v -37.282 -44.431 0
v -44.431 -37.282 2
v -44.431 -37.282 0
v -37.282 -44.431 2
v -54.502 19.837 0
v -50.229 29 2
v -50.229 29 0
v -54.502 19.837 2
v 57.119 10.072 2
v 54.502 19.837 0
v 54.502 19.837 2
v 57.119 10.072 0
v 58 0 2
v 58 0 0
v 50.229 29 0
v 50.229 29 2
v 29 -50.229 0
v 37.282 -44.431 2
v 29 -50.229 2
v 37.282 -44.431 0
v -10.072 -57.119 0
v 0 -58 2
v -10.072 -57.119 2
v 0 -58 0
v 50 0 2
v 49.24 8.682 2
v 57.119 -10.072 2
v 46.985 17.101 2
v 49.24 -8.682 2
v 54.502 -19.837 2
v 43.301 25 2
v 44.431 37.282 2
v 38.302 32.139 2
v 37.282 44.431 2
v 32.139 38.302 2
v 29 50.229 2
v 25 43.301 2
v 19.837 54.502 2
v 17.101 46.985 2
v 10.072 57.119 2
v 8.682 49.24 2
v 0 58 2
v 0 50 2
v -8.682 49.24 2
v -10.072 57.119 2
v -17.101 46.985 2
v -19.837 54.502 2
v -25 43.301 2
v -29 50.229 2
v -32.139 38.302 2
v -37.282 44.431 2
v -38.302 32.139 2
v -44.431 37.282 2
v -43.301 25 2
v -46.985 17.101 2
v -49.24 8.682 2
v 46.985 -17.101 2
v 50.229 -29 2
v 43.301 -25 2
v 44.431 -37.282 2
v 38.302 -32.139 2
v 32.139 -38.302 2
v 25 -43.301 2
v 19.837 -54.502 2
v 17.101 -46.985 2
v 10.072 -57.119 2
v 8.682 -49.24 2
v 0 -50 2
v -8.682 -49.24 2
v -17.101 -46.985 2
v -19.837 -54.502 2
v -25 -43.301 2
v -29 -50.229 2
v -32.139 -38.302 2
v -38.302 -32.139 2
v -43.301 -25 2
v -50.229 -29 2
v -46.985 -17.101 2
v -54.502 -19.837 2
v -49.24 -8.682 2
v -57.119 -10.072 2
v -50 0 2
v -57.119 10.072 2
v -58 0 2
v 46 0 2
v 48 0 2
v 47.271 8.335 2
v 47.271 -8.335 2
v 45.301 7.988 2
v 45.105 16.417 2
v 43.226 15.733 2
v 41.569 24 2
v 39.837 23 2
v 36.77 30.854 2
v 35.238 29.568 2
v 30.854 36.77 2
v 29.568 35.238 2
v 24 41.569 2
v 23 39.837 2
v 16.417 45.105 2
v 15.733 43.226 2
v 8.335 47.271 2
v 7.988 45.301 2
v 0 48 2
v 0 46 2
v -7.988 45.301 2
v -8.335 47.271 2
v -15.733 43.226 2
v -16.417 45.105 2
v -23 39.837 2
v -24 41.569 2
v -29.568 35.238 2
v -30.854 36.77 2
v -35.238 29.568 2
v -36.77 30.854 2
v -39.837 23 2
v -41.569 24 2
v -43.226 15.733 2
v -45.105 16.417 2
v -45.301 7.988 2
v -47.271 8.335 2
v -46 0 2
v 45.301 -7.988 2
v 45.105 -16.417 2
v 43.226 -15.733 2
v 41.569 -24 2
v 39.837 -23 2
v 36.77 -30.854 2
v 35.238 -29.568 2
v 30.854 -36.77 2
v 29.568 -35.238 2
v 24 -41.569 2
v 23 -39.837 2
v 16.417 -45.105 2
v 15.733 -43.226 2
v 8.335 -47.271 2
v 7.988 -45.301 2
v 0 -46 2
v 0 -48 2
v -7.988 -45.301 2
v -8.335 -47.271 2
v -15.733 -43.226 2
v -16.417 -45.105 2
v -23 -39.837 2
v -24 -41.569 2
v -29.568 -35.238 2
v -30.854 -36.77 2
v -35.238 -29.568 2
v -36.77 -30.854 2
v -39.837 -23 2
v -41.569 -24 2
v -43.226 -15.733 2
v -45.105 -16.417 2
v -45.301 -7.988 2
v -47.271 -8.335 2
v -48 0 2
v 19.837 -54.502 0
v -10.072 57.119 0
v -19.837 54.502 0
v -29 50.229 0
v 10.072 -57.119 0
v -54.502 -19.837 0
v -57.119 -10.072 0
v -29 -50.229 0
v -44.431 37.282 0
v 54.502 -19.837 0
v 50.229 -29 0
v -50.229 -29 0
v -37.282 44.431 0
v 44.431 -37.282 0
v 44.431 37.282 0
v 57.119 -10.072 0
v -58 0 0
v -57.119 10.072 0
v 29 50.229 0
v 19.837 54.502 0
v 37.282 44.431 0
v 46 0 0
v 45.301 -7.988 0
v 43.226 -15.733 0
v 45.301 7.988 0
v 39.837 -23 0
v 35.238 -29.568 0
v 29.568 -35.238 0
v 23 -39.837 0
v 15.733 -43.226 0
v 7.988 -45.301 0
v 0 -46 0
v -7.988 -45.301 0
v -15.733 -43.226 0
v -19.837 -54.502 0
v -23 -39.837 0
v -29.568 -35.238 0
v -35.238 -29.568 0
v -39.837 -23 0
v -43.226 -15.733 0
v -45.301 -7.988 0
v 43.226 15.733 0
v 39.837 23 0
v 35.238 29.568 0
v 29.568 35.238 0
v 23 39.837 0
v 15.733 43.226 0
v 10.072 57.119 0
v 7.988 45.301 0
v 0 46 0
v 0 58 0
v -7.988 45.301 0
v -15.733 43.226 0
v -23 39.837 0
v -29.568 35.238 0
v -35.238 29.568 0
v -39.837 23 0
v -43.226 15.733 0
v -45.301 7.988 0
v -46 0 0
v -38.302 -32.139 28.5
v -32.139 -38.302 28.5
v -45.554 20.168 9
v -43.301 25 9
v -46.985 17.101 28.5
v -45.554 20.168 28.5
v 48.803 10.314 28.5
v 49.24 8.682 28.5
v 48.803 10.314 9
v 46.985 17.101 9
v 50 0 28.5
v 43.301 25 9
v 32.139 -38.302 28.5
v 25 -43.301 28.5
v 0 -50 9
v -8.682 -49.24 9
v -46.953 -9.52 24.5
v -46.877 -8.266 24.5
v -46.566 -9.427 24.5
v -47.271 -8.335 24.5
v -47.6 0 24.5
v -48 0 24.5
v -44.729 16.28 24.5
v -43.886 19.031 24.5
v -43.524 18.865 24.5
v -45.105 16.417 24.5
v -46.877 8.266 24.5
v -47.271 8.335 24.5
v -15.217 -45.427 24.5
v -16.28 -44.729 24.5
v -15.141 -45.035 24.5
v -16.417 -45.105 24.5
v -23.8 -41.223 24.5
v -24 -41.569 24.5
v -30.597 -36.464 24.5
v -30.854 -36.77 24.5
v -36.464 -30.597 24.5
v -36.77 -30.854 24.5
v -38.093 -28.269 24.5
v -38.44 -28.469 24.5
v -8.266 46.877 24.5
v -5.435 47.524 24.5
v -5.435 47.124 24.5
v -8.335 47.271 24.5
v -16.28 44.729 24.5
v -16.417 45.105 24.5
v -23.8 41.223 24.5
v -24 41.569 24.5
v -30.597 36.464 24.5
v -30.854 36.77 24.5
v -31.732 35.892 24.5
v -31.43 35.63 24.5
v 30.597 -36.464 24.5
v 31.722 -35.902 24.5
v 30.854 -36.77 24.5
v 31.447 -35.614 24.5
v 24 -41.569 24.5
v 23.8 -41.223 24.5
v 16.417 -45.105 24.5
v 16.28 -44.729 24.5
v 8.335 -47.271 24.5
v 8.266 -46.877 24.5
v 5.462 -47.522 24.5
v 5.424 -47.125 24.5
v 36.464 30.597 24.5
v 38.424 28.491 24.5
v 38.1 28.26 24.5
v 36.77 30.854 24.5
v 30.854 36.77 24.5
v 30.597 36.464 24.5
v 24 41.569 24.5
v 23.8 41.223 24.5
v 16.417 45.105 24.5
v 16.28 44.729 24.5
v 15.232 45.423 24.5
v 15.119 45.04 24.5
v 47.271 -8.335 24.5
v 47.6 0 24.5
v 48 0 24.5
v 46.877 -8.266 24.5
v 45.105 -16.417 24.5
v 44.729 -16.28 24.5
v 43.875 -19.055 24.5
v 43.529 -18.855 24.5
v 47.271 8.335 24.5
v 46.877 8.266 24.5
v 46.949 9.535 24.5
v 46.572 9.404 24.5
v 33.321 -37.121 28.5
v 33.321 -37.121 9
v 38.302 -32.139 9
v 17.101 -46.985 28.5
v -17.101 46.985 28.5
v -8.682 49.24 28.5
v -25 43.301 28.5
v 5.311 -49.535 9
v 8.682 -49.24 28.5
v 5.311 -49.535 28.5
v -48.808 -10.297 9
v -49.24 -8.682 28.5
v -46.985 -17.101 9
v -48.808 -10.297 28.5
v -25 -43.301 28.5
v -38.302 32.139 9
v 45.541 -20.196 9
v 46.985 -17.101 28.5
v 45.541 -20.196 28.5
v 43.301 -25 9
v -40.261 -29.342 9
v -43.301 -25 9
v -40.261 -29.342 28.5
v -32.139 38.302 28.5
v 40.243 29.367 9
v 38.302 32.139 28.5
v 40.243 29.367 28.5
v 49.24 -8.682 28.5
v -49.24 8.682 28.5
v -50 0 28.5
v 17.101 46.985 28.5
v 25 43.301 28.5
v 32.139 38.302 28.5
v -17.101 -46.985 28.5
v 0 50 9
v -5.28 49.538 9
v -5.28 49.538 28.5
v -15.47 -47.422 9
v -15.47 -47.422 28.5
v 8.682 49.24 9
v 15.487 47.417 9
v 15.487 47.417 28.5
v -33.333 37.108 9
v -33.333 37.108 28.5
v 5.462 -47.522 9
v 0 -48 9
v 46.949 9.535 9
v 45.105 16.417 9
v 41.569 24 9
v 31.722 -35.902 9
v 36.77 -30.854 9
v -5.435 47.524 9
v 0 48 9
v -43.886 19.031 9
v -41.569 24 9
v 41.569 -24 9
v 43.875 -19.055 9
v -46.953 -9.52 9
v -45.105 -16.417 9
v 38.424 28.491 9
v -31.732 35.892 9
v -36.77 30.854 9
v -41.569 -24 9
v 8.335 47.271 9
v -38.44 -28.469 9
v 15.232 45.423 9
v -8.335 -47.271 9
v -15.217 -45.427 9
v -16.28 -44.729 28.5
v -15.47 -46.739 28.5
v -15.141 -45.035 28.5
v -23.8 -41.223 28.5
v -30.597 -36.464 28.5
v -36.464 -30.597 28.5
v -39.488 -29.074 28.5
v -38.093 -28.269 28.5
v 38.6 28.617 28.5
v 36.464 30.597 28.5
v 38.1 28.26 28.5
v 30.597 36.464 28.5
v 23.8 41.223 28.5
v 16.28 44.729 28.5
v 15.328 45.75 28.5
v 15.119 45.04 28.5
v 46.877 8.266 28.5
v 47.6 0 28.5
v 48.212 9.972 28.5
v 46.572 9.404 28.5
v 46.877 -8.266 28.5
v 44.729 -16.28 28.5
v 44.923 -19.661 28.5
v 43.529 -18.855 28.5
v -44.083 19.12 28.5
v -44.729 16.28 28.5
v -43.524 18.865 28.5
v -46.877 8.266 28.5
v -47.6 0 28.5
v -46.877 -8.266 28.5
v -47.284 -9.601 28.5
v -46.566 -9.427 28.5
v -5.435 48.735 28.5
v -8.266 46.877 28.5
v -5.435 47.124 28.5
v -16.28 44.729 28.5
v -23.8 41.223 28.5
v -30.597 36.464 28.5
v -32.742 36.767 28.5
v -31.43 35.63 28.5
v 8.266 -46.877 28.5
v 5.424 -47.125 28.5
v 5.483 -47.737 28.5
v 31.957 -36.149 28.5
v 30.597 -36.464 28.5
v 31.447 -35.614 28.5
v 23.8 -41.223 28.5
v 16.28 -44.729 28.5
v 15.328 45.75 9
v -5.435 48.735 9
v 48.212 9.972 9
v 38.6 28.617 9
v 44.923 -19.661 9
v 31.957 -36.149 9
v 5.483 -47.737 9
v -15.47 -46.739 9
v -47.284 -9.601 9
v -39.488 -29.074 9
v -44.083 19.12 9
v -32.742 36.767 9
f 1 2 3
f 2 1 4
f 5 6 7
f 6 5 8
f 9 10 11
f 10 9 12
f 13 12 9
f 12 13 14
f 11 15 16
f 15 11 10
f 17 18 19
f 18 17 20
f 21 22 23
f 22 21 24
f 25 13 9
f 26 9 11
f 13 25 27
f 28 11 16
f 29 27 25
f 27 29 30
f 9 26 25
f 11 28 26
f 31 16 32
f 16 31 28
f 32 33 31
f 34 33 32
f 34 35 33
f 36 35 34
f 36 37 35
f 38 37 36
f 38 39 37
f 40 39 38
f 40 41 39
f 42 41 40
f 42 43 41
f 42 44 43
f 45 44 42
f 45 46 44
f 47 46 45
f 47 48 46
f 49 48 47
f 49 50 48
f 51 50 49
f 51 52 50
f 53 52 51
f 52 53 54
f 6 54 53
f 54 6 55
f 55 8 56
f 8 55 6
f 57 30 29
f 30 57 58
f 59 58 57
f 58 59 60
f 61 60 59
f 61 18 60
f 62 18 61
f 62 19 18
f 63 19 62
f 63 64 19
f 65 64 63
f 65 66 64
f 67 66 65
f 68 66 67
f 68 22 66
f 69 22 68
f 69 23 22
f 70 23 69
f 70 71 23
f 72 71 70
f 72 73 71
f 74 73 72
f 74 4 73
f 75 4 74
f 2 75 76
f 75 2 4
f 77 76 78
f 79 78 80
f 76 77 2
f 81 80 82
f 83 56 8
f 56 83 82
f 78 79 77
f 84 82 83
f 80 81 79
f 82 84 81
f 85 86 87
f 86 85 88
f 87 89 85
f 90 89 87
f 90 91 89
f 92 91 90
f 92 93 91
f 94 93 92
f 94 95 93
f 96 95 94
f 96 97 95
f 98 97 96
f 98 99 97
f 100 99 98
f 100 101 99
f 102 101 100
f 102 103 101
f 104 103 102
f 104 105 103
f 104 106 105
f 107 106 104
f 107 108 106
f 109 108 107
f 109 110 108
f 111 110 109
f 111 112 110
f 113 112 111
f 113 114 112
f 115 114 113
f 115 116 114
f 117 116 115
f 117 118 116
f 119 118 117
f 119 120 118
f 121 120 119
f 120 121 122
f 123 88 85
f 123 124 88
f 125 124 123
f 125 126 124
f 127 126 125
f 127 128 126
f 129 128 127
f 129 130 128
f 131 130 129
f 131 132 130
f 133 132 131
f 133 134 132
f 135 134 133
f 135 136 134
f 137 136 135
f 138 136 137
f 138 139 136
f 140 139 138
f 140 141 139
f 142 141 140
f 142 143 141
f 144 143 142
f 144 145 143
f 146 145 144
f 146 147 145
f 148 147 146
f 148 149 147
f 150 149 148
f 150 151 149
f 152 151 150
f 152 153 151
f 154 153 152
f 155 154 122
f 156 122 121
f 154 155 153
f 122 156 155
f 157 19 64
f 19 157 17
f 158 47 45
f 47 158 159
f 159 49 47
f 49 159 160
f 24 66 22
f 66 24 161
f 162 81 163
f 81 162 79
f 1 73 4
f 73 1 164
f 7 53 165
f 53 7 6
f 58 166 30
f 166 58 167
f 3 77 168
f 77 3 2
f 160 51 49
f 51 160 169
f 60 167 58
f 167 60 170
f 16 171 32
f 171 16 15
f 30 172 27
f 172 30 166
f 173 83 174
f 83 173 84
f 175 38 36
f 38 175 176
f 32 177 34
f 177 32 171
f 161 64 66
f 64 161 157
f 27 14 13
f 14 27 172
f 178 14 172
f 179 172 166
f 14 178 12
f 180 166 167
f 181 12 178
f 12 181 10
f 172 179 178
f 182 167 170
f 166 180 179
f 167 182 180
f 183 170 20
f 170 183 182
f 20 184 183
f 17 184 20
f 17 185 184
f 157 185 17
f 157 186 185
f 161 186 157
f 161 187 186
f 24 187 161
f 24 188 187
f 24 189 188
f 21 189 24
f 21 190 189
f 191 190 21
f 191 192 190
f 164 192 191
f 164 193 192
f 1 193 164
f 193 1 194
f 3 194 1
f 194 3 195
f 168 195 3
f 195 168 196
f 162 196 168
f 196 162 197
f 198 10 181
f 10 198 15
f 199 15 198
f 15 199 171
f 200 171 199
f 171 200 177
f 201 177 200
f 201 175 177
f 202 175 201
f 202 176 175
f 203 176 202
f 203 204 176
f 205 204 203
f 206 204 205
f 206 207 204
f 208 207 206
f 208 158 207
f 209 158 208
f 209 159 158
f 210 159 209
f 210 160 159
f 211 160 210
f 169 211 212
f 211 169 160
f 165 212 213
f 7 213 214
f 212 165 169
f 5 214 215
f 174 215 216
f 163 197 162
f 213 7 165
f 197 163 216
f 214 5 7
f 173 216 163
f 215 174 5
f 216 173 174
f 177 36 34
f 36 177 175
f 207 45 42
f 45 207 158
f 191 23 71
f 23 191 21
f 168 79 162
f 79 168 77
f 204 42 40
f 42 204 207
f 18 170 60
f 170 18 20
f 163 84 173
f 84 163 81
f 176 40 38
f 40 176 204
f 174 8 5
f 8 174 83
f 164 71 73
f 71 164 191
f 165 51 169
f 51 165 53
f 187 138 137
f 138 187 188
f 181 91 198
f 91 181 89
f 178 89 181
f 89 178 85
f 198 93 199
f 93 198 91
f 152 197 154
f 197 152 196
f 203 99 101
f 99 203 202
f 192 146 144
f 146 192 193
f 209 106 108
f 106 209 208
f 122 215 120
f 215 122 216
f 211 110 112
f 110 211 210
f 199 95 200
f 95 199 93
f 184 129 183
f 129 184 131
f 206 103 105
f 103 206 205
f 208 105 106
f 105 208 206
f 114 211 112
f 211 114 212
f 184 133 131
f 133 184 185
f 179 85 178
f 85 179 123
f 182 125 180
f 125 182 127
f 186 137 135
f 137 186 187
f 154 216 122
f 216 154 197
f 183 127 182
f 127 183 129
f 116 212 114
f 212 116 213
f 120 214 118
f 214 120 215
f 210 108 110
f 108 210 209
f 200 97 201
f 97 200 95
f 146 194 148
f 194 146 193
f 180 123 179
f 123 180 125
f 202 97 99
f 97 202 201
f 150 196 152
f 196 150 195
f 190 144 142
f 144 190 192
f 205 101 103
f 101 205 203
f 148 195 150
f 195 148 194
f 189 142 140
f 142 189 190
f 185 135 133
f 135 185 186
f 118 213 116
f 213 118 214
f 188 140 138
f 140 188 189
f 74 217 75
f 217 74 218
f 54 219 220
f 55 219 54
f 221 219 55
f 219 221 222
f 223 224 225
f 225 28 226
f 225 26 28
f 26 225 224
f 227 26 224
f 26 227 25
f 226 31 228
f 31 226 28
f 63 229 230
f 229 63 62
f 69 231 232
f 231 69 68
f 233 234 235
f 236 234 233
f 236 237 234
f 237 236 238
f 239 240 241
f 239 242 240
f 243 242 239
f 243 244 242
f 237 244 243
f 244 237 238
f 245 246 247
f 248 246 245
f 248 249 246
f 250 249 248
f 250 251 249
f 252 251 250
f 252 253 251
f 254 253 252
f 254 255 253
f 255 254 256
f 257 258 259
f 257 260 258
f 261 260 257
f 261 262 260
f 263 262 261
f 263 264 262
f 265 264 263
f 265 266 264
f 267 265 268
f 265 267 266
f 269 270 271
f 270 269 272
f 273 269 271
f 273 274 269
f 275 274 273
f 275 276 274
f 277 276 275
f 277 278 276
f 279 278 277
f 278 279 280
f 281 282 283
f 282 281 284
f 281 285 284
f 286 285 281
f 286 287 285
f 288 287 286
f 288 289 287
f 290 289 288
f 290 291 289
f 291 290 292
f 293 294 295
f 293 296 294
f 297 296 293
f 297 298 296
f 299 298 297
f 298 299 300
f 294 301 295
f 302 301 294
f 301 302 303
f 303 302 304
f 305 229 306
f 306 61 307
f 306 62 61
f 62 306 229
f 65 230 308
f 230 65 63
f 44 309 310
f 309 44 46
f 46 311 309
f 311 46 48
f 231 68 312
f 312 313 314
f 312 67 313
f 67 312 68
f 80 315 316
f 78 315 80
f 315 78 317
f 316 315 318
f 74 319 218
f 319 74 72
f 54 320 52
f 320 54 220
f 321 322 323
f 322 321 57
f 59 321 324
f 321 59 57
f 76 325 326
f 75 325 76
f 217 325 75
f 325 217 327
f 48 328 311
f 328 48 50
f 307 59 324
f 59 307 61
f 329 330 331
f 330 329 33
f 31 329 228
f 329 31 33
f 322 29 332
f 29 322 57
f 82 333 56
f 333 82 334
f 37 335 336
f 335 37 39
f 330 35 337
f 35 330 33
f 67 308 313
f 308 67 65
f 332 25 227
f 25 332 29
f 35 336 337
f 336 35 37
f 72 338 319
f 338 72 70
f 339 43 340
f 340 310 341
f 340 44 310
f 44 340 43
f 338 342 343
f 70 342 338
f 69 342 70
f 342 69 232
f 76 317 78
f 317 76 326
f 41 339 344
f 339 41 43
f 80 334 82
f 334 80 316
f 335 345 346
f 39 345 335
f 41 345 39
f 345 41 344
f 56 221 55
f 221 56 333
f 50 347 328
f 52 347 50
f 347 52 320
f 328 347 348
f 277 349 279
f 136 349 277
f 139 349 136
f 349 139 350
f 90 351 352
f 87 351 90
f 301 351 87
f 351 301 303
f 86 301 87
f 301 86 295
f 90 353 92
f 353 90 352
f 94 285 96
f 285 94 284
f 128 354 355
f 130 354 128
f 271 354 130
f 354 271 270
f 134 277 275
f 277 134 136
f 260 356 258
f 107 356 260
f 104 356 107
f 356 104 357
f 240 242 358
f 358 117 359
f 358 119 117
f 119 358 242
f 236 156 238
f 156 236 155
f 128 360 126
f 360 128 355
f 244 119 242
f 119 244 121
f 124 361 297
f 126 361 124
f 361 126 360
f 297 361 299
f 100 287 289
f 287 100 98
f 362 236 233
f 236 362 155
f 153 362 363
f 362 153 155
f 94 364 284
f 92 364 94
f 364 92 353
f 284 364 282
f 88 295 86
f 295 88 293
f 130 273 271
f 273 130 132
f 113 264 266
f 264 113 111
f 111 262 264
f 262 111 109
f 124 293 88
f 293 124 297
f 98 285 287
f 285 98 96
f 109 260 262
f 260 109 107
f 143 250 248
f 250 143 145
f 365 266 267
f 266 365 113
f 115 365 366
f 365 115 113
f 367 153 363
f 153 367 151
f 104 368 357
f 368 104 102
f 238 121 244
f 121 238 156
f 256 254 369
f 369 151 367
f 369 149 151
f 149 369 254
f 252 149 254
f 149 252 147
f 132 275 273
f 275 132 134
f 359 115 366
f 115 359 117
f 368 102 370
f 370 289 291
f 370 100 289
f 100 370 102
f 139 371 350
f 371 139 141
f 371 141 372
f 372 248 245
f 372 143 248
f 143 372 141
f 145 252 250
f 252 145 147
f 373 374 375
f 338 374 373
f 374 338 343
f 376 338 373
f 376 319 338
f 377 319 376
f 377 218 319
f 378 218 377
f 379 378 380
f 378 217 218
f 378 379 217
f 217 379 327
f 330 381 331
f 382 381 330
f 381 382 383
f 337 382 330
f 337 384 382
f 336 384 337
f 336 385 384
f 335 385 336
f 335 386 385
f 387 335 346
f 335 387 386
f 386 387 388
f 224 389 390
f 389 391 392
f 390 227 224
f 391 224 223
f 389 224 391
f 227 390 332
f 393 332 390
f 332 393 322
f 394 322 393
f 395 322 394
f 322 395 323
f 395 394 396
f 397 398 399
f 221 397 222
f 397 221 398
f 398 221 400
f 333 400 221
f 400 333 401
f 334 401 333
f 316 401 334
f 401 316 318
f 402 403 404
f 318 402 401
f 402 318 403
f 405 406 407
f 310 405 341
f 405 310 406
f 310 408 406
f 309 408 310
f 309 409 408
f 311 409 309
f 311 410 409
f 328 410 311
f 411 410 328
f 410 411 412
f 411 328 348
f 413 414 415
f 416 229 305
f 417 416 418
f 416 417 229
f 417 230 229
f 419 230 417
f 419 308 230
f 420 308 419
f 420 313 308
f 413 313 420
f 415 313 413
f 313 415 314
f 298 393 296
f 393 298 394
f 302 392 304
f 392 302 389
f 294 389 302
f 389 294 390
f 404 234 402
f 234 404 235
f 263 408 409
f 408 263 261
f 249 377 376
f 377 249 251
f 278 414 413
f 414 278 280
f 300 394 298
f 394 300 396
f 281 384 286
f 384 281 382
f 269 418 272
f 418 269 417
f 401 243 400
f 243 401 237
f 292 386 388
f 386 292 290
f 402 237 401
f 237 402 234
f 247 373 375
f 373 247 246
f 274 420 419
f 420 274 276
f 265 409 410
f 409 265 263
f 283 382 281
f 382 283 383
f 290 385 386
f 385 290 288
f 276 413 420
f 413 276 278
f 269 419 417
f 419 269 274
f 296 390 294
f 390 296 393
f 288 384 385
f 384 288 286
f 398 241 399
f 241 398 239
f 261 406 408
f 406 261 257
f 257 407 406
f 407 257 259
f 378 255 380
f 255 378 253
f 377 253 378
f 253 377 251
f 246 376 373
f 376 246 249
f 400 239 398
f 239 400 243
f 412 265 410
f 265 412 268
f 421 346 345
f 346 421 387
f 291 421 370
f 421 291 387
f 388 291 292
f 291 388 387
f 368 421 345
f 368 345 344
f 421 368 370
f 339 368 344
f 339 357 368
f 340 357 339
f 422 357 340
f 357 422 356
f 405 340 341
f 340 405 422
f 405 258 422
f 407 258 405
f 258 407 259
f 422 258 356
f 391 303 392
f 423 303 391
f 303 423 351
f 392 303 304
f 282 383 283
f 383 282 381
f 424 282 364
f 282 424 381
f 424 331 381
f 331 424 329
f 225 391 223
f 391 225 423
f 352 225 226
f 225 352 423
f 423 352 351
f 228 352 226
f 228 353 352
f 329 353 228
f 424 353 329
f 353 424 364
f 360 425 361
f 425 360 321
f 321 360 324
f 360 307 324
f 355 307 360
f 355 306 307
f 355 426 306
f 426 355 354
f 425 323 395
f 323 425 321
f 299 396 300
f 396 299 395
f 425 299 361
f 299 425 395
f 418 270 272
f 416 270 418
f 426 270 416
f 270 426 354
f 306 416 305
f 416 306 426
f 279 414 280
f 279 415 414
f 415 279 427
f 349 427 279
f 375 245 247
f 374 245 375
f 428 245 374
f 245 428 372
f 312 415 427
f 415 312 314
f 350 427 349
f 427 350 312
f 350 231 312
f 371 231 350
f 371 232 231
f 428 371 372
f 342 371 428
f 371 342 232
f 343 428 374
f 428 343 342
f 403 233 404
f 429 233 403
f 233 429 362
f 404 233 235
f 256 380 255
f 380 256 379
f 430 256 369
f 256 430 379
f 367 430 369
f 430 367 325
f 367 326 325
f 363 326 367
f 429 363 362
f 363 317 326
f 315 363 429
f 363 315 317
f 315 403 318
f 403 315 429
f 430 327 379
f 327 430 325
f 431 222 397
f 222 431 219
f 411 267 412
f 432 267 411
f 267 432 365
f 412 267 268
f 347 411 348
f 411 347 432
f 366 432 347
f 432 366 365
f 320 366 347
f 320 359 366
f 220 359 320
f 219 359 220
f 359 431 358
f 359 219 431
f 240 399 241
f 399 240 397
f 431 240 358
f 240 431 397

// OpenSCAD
// Circle resolution - 1 degree is usually smooth enough, but use 10 for faster rendering
$fa = 10;

// Main parameter
objectiveDiameter = 96;
objectiveRadius = objectiveDiameter/2;

thickness = 2;
depth = 22.5;
rimWidth = 10;
rimRadius = objectiveRadius + rimWidth;
rimRidge = 2;

// The gap between parts - smaller will give you a tighter fit, but risks not being able to fit at all.
errorMargin = 0.4;

// This is probably in the standard library
module ring(inner, outer, height)
{
    cutHeight = height + 2;

	difference() 
	{
  		cylinder(h=height, r=outer);
  		translate ([0,0,-1]) cylinder(h=cutHeight, r=inner);
	}
}



module lens() {
	ring(inner=objectiveRadius-rimRidge, outer=rimRadius, height=thickness);
	translate ([0,0,thickness]) ring(inner=objectiveRadius, outer=objectiveRadius+thickness, height=depth);
    translate ([0,0,thickness+depth]) ring(inner=objectiveRadius-0.4, outer=objectiveRadius+thickness, height=4);
}

// The lens attachment - the lens module with bits cut out. Makes it a lot easier to attach than a solid ring
module lensAttachment() {
  difference() {
	lens();	
	for (i = [0:5]) {
		translate([sin(6+360*i/6)*objectiveRadius, cos(6+360*i/6)*objectiveRadius, 9 ])
		cylinder(h = depth+10, r=10.5);
	}
  }
}

lensAttachment();


// The filter cover
module filterCover() {
   	ring(inner=objectiveRadius-rimRidge, outer=rimRadius+thickness+errorMargin, height=thickness);
	translate([0,0,thickness]) ring(inner=rimRadius+errorMargin, outer=rimRadius+thickness+errorMargin, height=thickness);
}

//filterCover();
